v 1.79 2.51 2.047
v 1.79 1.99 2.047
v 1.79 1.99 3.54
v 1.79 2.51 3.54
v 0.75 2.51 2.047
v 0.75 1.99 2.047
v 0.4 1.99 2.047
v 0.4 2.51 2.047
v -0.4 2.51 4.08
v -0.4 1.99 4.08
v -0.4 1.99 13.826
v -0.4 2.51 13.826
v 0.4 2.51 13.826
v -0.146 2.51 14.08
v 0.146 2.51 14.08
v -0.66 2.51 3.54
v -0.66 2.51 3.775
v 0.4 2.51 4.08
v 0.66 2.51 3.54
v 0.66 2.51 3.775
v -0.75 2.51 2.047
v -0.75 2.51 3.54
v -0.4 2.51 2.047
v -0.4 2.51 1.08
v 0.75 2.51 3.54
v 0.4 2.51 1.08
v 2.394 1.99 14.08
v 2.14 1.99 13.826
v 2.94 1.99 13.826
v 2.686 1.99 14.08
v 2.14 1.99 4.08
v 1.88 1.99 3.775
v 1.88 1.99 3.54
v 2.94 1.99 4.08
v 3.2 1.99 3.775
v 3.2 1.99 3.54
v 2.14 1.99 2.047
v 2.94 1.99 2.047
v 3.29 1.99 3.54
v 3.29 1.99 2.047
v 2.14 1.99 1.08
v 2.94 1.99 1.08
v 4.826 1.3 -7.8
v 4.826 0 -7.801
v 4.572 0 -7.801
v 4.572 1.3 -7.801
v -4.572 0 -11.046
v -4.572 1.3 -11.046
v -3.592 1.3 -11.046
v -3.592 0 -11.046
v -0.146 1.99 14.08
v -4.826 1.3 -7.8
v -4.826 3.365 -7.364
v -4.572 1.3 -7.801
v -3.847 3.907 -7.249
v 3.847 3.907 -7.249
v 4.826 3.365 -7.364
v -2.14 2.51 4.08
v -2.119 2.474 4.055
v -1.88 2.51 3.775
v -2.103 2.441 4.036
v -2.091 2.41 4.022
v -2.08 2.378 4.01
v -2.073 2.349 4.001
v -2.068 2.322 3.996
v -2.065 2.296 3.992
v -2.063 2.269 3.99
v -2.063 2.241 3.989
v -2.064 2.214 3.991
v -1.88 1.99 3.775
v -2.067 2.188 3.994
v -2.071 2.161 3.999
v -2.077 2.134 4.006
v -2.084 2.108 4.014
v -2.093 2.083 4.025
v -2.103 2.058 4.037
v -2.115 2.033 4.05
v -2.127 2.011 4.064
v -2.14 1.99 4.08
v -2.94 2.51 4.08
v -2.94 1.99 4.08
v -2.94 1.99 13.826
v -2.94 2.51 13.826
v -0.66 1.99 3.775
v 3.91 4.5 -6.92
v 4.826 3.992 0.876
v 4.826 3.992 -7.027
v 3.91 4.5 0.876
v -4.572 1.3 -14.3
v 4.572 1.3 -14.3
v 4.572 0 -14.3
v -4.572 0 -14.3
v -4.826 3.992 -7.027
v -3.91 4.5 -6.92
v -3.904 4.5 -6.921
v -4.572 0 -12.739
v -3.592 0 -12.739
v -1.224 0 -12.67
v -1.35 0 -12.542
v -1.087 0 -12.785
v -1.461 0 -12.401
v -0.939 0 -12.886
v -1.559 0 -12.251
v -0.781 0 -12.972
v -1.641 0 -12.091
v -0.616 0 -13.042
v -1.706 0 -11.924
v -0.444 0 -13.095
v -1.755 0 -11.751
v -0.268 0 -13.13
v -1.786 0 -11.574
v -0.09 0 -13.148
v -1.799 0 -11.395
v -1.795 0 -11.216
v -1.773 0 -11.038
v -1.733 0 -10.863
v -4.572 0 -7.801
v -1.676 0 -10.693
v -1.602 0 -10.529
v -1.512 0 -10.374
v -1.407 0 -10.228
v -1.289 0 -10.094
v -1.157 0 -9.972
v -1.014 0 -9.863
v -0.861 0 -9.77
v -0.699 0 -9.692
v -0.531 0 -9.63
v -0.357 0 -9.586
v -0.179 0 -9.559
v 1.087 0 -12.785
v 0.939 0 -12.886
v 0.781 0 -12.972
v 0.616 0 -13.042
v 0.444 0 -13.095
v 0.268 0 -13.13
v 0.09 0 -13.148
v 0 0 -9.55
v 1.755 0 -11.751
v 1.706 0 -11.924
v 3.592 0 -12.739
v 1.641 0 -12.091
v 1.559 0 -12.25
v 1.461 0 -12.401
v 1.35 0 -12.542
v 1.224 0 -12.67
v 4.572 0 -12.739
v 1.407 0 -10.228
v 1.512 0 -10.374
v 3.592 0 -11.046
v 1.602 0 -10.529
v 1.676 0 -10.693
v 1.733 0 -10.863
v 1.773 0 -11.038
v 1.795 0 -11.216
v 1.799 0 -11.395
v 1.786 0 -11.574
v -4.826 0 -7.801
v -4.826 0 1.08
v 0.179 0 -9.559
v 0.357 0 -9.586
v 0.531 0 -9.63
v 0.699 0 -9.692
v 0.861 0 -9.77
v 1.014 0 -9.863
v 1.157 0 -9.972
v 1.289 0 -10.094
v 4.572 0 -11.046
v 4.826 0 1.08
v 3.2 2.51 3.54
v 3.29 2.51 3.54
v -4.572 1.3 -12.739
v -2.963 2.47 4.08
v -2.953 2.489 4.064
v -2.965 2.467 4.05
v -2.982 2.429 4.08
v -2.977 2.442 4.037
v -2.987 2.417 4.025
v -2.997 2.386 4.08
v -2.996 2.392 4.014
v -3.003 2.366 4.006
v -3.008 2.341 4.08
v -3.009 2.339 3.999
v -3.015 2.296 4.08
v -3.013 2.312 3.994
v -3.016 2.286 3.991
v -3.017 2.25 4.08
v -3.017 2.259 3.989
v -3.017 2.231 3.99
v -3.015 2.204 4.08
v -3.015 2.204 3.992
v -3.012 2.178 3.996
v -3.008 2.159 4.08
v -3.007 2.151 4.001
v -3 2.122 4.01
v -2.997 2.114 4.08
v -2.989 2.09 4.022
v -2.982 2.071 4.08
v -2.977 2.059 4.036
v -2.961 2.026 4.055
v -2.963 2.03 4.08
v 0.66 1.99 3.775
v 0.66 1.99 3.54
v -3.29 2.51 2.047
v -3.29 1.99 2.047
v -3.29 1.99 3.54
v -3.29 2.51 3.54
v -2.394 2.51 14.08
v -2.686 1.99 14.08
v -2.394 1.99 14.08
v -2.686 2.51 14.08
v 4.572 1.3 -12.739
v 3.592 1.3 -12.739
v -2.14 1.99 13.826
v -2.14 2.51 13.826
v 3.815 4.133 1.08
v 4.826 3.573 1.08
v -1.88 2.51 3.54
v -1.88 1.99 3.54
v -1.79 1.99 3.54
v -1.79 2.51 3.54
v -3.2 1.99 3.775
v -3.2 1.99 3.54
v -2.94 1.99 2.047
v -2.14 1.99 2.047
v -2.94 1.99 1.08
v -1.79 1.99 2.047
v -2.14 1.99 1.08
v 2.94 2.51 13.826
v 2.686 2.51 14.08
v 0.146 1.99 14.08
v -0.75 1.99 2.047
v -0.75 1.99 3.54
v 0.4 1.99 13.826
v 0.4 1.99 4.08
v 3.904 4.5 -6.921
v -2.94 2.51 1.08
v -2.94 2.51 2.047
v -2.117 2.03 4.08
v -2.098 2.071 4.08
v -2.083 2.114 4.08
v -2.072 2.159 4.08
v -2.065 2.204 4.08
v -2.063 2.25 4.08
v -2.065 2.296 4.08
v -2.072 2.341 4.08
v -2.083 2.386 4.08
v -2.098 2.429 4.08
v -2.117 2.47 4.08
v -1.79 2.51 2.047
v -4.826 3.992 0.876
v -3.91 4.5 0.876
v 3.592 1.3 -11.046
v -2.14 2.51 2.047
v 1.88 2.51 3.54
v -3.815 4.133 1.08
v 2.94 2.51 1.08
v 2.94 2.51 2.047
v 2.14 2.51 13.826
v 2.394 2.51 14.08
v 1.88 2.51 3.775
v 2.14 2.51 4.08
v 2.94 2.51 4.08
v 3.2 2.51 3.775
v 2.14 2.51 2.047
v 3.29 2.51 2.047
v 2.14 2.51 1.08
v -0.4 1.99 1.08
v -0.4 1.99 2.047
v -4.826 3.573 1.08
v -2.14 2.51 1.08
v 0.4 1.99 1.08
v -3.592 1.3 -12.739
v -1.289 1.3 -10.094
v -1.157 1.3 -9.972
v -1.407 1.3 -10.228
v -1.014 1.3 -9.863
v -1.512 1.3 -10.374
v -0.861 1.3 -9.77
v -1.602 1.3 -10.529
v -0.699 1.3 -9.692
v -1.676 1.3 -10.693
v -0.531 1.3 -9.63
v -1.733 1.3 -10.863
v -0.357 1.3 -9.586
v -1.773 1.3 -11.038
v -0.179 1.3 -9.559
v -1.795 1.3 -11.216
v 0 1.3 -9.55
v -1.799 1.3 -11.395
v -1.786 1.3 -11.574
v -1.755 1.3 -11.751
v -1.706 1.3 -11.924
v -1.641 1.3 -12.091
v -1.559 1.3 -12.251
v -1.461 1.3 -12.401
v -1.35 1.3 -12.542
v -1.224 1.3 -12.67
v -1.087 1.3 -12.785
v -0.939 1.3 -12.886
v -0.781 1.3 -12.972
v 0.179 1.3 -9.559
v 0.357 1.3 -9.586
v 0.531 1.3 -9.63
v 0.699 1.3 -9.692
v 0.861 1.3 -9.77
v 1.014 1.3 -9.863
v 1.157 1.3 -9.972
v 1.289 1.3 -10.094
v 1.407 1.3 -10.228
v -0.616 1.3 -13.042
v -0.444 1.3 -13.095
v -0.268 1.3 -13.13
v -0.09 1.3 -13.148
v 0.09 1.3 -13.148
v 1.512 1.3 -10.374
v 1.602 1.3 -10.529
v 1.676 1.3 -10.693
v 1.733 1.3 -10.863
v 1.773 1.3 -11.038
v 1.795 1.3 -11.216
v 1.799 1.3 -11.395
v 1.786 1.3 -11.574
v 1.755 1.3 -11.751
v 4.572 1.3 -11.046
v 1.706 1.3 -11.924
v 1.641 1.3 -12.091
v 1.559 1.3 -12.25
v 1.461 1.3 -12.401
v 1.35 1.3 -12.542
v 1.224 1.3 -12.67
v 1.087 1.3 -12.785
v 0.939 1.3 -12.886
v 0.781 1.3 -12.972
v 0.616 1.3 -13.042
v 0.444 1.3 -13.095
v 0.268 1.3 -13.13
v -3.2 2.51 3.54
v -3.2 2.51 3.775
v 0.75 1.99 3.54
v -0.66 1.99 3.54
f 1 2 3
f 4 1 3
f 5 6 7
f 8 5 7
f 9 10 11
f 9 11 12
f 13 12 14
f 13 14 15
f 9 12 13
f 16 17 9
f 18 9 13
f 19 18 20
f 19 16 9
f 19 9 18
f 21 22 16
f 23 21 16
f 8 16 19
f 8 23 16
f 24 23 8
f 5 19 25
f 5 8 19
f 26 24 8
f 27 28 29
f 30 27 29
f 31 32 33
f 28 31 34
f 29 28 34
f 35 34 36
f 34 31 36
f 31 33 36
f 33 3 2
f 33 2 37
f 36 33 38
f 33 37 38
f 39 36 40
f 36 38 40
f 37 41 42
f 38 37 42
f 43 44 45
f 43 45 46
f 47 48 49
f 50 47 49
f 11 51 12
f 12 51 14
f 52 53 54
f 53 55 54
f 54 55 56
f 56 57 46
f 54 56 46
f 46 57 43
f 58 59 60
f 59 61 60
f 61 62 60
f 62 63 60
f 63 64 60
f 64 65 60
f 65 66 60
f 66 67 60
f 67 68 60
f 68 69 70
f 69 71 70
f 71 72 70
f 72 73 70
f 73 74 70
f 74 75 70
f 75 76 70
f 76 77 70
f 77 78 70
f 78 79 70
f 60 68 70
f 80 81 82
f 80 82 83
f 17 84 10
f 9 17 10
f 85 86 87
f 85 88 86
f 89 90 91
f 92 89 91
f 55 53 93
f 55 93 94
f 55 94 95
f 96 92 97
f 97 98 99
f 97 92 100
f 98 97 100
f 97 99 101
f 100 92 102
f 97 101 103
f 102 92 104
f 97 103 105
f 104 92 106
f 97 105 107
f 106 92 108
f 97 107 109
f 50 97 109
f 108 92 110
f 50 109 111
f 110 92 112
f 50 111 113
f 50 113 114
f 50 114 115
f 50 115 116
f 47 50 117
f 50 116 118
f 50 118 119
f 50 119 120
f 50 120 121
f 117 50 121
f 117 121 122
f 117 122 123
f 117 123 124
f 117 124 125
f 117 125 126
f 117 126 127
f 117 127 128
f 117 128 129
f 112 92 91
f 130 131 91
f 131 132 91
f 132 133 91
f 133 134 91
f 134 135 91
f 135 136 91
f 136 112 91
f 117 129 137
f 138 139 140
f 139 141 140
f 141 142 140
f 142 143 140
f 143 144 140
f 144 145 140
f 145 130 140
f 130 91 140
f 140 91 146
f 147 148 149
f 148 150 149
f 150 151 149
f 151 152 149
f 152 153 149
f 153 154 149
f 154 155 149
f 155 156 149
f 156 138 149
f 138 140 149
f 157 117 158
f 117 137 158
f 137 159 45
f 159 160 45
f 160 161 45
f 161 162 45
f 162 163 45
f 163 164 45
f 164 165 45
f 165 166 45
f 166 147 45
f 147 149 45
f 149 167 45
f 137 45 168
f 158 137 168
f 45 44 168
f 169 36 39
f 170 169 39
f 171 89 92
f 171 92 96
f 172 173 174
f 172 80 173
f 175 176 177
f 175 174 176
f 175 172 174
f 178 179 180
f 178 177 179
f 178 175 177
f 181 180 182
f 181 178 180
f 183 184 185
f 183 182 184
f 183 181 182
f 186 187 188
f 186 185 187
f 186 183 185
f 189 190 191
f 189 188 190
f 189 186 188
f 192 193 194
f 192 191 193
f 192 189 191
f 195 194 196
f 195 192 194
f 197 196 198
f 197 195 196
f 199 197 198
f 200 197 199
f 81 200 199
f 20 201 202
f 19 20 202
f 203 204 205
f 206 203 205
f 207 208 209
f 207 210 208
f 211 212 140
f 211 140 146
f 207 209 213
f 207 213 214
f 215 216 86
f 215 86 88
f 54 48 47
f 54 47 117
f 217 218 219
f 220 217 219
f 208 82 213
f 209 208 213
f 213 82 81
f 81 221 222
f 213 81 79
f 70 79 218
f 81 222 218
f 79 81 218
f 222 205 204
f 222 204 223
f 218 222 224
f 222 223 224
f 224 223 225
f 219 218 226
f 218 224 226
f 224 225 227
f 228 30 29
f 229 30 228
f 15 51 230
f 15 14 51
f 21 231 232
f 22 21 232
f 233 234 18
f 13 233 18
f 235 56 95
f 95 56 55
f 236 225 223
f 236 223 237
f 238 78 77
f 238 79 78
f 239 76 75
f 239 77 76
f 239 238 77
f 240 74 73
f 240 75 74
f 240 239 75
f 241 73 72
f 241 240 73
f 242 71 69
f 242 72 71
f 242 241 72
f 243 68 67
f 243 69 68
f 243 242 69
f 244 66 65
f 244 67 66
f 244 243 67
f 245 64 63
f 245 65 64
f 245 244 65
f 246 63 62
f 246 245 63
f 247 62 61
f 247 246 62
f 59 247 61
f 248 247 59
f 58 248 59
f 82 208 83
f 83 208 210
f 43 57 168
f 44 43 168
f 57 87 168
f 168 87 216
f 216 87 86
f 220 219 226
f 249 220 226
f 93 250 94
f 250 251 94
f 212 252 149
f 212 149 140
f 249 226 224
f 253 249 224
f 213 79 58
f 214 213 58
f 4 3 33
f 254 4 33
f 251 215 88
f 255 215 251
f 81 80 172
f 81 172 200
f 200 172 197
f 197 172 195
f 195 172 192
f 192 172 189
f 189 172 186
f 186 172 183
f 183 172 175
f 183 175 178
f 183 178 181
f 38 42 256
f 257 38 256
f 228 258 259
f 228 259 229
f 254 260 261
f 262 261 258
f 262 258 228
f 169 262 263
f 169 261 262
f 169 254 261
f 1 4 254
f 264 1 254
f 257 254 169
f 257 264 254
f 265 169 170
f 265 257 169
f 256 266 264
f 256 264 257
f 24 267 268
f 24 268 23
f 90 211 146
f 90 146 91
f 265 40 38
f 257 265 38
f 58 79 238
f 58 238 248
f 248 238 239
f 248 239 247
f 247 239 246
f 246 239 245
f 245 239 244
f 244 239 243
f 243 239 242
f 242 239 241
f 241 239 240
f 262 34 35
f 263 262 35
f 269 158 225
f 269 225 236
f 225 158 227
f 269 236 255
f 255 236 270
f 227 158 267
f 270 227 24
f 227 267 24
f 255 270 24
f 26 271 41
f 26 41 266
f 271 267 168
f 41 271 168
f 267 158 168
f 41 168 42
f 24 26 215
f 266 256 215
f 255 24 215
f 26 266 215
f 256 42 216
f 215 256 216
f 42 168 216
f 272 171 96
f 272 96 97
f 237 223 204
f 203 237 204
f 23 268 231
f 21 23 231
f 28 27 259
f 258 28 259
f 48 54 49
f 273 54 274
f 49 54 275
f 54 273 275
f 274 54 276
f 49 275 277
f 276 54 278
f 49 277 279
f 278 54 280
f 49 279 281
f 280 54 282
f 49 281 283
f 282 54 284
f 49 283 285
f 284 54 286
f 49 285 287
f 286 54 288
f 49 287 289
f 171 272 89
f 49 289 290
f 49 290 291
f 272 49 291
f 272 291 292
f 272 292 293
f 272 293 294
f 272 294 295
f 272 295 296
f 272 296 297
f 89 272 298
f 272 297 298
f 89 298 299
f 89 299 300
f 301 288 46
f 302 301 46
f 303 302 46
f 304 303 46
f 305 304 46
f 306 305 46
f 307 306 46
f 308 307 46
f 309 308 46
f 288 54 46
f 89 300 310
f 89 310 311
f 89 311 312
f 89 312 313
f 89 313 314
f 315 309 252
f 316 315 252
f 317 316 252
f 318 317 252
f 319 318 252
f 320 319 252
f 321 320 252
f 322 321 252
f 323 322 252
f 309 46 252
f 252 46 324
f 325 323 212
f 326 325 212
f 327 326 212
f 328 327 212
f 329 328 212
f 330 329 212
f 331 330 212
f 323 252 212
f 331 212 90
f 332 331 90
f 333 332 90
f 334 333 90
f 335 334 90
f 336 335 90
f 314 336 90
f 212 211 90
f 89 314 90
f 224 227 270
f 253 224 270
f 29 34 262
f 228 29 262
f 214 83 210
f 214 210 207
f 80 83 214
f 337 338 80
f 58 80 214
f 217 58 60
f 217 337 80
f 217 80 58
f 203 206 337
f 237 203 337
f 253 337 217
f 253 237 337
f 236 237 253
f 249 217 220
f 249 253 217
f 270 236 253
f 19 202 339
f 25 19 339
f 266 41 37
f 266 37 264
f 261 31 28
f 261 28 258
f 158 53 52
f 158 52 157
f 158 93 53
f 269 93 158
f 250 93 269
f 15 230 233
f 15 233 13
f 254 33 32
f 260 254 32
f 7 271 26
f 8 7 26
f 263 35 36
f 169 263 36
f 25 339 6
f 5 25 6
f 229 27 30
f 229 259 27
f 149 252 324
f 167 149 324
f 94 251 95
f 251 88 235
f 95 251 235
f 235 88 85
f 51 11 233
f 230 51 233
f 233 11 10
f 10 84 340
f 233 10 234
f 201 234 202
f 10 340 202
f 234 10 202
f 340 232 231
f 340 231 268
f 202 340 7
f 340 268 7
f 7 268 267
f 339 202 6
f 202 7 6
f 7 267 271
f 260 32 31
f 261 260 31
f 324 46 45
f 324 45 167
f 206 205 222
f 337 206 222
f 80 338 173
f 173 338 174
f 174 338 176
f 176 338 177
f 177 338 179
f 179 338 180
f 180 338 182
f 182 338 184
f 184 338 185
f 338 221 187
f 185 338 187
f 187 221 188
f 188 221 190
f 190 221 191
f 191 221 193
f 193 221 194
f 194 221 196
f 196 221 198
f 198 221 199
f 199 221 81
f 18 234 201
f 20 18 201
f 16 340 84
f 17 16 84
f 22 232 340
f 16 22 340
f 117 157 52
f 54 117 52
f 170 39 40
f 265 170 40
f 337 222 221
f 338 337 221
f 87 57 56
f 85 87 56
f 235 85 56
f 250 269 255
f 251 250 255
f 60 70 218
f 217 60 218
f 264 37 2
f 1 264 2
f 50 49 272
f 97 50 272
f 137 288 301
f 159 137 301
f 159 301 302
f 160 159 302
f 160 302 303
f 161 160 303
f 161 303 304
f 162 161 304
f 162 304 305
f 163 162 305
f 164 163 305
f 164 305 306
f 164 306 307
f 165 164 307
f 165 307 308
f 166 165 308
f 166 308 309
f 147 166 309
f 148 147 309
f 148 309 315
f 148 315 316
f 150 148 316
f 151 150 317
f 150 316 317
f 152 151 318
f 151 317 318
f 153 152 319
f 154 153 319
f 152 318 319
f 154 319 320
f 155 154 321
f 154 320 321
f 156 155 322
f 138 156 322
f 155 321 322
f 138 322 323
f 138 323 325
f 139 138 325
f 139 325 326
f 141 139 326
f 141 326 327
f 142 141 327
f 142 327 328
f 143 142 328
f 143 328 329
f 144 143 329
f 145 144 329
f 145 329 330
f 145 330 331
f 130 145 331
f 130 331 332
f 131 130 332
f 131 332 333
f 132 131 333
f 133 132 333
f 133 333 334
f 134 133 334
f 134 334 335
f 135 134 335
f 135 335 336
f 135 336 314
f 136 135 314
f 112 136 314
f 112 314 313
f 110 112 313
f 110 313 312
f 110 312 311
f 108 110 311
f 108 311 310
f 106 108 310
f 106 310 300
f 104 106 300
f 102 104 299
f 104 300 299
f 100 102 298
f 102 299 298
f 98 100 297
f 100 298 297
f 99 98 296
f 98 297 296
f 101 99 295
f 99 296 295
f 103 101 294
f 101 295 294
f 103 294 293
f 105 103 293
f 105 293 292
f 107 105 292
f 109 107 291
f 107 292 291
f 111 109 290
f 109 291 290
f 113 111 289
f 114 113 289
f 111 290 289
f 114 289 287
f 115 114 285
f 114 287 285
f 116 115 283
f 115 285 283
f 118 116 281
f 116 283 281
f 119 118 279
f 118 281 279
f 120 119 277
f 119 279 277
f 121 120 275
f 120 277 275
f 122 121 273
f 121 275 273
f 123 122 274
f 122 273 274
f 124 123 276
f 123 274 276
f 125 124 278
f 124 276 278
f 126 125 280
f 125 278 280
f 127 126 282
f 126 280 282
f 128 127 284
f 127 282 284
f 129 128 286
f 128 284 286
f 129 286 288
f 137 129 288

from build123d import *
from OCP.BRepFilletAPI import BRepFilletAPI_MakeChamfer

# Parameters (mm, degrees)
EXTRUDE1_DEPTH      = 4.826
EXTRUDE1_DEPTH_BACK = 4.826
SKETCH10_R          = 1.8
SKETCH10_W          = 1.233836604
SKETCH10_H          = 1.6931216
EXTRUDE5_DEPTH      = 16.428369203
SKETCH6_W           = 0.8
SKETCH6_H           = 0.52
EXTRUDE6_DEPTH      = 13
EXTRUDE7_START      = -0.52
EXTRUDE7_DEPTH      = 0.52
CHAMFER1_SIZE       = 0.254
SKETCH12_W          = 7.379682426
SKETCH12_H          = 2.736118788
EXTRUDE8_DEPTH      = 0.254
SKETCH13_W          = 7.379682426
SKETCH13_H          = 2.736118788
EXTRUDE9_DEPTH      = 0.254
CHAMFER2_SIZE       = 0.508
CHAMFER2_SIZE2      = 0.91645626
CHAMFER3_SIZE       = 0.2032
CHAMFER3_SIZE2      = 0.366582504
CHAMFER3_SIZE2_2    = 0.605677555
CHAMFER3_SIZE2_3    = 0.557834937
EXTRUDE10_DEPTH     = 1.016


with BuildPart() as part:
    # Sketch2 → Extrude1 (new, two sides)
    with BuildSketch(Plane(origin=(0, 0, 0), x_dir=(0, 0, -1), z_dir=(1, 0, 0))) as extrude1_sk:
        Polygon((14.3005, 0), (-1.0795, 0), (-1.0795, 4.5), (7.124012877, 4.5), (7.8005, 1.3), (14.3005, 1.3), align=None)
    extrude(amount=EXTRUDE1_DEPTH)
    extrude(extrude1_sk.sketch, amount=-EXTRUDE1_DEPTH_BACK)

    # Sketch10 → Extrude5 (cut, through all)
    with BuildSketch(Plane(origin=(0, 1.3, 0), x_dir=(1, 0, 0), z_dir=(0, 1, 0))):
        with Locations(Location((0, 11.3505, 0), (0, 0, 270))):
            Circle(SKETCH10_R)
        with Locations((-4.209081698, 11.892729701)):
            Rectangle(SKETCH10_W, SKETCH10_H)
        with Locations((4.209081698, 11.892729701)):
            Rectangle(SKETCH10_W, SKETCH10_H)
    extrude(amount=-EXTRUDE5_DEPTH, mode=Mode.SUBTRACT)

    # Sketch6 → Extrude6 (add)
    with BuildSketch(Plane.XY.offset(1.0795)):
        with Locations((2.54, 2.25)):
            Rectangle(SKETCH6_W, SKETCH6_H)
        with Locations((-2.54, 2.25)):
            Rectangle(SKETCH6_W, SKETCH6_H)
        with Locations((0, 2.25)):
            Rectangle(SKETCH6_W, SKETCH6_H)
    extrude(amount=EXTRUDE6_DEPTH)

    # Sketch11 → Extrude7 (add)
    with BuildSketch(Plane(origin=(0, 2.51, 0), x_dir=(1, 0, 0), z_dir=(0, 1, 0)).offset(EXTRUDE7_START)):
        Polygon((-2.94, -2.0475), (-3.29, -2.0475), (-3.29, -3.5395), (-3.2004, -3.5395), (-3.2004, -3.7747), (-2.94, -4.0795), align=None)
        Polygon((-1.79, -2.0475), (-2.14, -2.0475), (-2.14, -4.0795), (-1.8796, -3.7747), (-1.8796, -3.5395), (-1.79, -3.5395), align=None)
        Polygon((-0.4, -2.0475), (-0.75, -2.0475), (-0.75, -3.5395), (-0.6604, -3.5395), (-0.6604, -3.7747), (-0.4, -4.0795), align=None)
        Polygon((0.75, -2.0475), (0.4, -2.0475), (0.4, -4.0795), (0.6604, -3.7747), (0.6604, -3.5395), (0.75, -3.5395), align=None)
        Polygon((2.14, -2.0475), (1.79, -2.0475), (1.79, -3.5395), (1.8796, -3.5395), (1.8796, -3.7747), (2.14, -4.0795), align=None)
        Polygon((3.29, -2.0475), (2.94, -2.0475), (2.94, -4.0795), (3.2004, -3.7747), (3.2004, -3.5395), (3.29, -3.5395), align=None)
    extrude(amount=EXTRUDE7_DEPTH)

    # Chamfer1
    chamfer1_edges = [part.edges().sort_by_distance(p)[0] for p in [
        (-2.14, 2.25, 14.0795),
        (-2.94, 2.25, 14.0795),
        (2.94, 2.25, 14.0795),
        (2.14, 2.25, 14.0795),
        (0.4, 2.25, 14.0795),
        (-0.4, 2.25, 14.0795),
    ]]
    chamfer(chamfer1_edges, length=CHAMFER1_SIZE)

    # Sketch12 → Extrude8 (cut)
    with BuildSketch(Plane.ZY.offset(4.826)):
        with Locations((-11.490341213, 1.368059394)):
            Rectangle(SKETCH12_W, SKETCH12_H)
    extrude(amount=-EXTRUDE8_DEPTH, mode=Mode.SUBTRACT)

    # Sketch13 → Extrude9 (cut)
    with BuildSketch(Plane(origin=(4.826, 0, 0), x_dir=(0, 0, -1), z_dir=(1, 0, 0))):
        with Locations((11.490341213, 1.368059394)):
            Rectangle(SKETCH13_W, SKETCH13_H)
    extrude(amount=-EXTRUDE9_DEPTH, mode=Mode.SUBTRACT)

    # Chamfer2: one chamfer whose edges measure the first distance from different faces: ONE call of the kernel's chamfer builder (chamfer() names one face for all edges)
    chamfer2_edges_1 = [part.edges().sort_by_distance(p)[0] for p in [
        (-4.826, 4.5, -3.022256439),
    ]]
    chamfer2_side_1 = [part.faces().sort_by_distance(p)[0] for p in [
        (-4.826, 2.217055195, -3.243165334),
    ]]
    chamfer2_edges_2 = [part.edges().sort_by_distance(p)[0] for p in [
        (4.826, 4.5, -3.022256439),
    ]]
    chamfer2_side_2 = [part.faces().sort_by_distance(p)[0] for p in [
        (4.826, 2.217055195, -3.243165334),
    ]]
    chamfer2 = BRepFilletAPI_MakeChamfer(part.part.solid().wrapped)
    for e in chamfer2_edges_1:
        chamfer2.Add(CHAMFER2_SIZE, CHAMFER2_SIZE2, e.wrapped, chamfer2_side_1[0].wrapped)  # the first distance lies on this face
    for e in chamfer2_edges_2:
        chamfer2.Add(CHAMFER2_SIZE, CHAMFER2_SIZE2, e.wrapped, chamfer2_side_2[0].wrapped)  # the first distance lies on this face
    add(Compound.cast(chamfer2.Shape()), mode=Mode.REPLACE)

    # Chamfer3: one chamfer whose edges measure the first distance from different faces: ONE call of the kernel's chamfer builder (chamfer() names one face for all edges)
    chamfer3_edges_1 = [part.edges().sort_by_distance(p)[0] for p in [
        (0, 4.5, 1.0795),
    ]]
    chamfer3_side_1 = [part.faces().sort_by_distance(p)[0] for p in [
        (0, 4.5, -3.022256439),
    ]]
    chamfer3_edges_2 = [part.edges().sort_by_distance(p)[0] for p in [
        (-4.36777187, 4.246, 1.0795),
    ]]
    chamfer3_side_2 = [part.faces().sort_by_distance(p)[0] for p in [
        (-4.368765147, 4.245449417, -3.049162718),
    ]]
    chamfer3_edges_3 = [part.edges().sort_by_distance(p)[0] for p in [
        (4.36777187, 4.246, 1.0795),
    ]]
    chamfer3_side_3 = [part.faces().sort_by_distance(p)[0] for p in [
        (4.368765147, 4.245449417, -3.049162718),
    ]]
    chamfer3_edges_4 = [part.edges().sort_by_distance(p)[0] for p in [
        (0, 4.5, -7.124012877),
    ]]
    chamfer3_side_4 = [part.faces().sort_by_distance(p)[0] for p in [
        (0, 4.5, -3.022256439),
    ]]
    chamfer3_edges_5 = [part.edges().sort_by_distance(p)[0] for p in [
        (-4.36777187, 4.246, -7.177709043),
    ]]
    chamfer3_side_5 = [part.faces().sort_by_distance(p)[0] for p in [
        (-4.368765147, 4.245449417, -3.049162718),
    ]]
    chamfer3_edges_6 = [part.edges().sort_by_distance(p)[0] for p in [
        (4.36777187, 4.246, -7.177709043),
    ]]
    chamfer3_side_6 = [part.faces().sort_by_distance(p)[0] for p in [
        (4.368765147, 4.245449417, -3.049162718),
    ]]
    chamfer3 = BRepFilletAPI_MakeChamfer(part.part.solid().wrapped)
    for e in chamfer3_edges_1:
        chamfer3.Add(CHAMFER3_SIZE, CHAMFER3_SIZE2, e.wrapped, chamfer3_side_1[0].wrapped)  # the first distance lies on this face
    for e in chamfer3_edges_2:
        chamfer3.Add(CHAMFER3_SIZE, CHAMFER3_SIZE2, e.wrapped, chamfer3_side_2[0].wrapped)  # the first distance lies on this face
    for e in chamfer3_edges_3:
        chamfer3.Add(CHAMFER3_SIZE, CHAMFER3_SIZE2, e.wrapped, chamfer3_side_3[0].wrapped)  # the first distance lies on this face
    for e in chamfer3_edges_4:
        chamfer3.Add(CHAMFER3_SIZE, CHAMFER3_SIZE2_2, e.wrapped, chamfer3_side_4[0].wrapped)  # the first distance lies on this face
    for e in chamfer3_edges_5:
        chamfer3.Add(CHAMFER3_SIZE, CHAMFER3_SIZE2_3, e.wrapped, chamfer3_side_5[0].wrapped)  # the first distance lies on this face
    for e in chamfer3_edges_6:
        chamfer3.Add(CHAMFER3_SIZE, CHAMFER3_SIZE2_3, e.wrapped, chamfer3_side_6[0].wrapped)  # the first distance lies on this face
    add(Compound.cast(chamfer3.Shape()), mode=Mode.REPLACE)

    # Sketch15 → Extrude10 (add)
    with BuildSketch(Plane.XY.offset(4.0795)):
        with BuildLine():
            Line((-2.14, 2.51), (-2.94, 2.51))
            ThreePointArc((-2.94, 2.51), (-3.017074418, 2.25), (-2.94, 1.99))
            Line((-2.94, 1.99), (-2.14, 1.99))
            ThreePointArc((-2.14, 1.99), (-2.062925582, 2.25), (-2.14, 2.51))
        make_face()
    extrude(amount=-EXTRUDE10_DEPTH)


solid = part.part
